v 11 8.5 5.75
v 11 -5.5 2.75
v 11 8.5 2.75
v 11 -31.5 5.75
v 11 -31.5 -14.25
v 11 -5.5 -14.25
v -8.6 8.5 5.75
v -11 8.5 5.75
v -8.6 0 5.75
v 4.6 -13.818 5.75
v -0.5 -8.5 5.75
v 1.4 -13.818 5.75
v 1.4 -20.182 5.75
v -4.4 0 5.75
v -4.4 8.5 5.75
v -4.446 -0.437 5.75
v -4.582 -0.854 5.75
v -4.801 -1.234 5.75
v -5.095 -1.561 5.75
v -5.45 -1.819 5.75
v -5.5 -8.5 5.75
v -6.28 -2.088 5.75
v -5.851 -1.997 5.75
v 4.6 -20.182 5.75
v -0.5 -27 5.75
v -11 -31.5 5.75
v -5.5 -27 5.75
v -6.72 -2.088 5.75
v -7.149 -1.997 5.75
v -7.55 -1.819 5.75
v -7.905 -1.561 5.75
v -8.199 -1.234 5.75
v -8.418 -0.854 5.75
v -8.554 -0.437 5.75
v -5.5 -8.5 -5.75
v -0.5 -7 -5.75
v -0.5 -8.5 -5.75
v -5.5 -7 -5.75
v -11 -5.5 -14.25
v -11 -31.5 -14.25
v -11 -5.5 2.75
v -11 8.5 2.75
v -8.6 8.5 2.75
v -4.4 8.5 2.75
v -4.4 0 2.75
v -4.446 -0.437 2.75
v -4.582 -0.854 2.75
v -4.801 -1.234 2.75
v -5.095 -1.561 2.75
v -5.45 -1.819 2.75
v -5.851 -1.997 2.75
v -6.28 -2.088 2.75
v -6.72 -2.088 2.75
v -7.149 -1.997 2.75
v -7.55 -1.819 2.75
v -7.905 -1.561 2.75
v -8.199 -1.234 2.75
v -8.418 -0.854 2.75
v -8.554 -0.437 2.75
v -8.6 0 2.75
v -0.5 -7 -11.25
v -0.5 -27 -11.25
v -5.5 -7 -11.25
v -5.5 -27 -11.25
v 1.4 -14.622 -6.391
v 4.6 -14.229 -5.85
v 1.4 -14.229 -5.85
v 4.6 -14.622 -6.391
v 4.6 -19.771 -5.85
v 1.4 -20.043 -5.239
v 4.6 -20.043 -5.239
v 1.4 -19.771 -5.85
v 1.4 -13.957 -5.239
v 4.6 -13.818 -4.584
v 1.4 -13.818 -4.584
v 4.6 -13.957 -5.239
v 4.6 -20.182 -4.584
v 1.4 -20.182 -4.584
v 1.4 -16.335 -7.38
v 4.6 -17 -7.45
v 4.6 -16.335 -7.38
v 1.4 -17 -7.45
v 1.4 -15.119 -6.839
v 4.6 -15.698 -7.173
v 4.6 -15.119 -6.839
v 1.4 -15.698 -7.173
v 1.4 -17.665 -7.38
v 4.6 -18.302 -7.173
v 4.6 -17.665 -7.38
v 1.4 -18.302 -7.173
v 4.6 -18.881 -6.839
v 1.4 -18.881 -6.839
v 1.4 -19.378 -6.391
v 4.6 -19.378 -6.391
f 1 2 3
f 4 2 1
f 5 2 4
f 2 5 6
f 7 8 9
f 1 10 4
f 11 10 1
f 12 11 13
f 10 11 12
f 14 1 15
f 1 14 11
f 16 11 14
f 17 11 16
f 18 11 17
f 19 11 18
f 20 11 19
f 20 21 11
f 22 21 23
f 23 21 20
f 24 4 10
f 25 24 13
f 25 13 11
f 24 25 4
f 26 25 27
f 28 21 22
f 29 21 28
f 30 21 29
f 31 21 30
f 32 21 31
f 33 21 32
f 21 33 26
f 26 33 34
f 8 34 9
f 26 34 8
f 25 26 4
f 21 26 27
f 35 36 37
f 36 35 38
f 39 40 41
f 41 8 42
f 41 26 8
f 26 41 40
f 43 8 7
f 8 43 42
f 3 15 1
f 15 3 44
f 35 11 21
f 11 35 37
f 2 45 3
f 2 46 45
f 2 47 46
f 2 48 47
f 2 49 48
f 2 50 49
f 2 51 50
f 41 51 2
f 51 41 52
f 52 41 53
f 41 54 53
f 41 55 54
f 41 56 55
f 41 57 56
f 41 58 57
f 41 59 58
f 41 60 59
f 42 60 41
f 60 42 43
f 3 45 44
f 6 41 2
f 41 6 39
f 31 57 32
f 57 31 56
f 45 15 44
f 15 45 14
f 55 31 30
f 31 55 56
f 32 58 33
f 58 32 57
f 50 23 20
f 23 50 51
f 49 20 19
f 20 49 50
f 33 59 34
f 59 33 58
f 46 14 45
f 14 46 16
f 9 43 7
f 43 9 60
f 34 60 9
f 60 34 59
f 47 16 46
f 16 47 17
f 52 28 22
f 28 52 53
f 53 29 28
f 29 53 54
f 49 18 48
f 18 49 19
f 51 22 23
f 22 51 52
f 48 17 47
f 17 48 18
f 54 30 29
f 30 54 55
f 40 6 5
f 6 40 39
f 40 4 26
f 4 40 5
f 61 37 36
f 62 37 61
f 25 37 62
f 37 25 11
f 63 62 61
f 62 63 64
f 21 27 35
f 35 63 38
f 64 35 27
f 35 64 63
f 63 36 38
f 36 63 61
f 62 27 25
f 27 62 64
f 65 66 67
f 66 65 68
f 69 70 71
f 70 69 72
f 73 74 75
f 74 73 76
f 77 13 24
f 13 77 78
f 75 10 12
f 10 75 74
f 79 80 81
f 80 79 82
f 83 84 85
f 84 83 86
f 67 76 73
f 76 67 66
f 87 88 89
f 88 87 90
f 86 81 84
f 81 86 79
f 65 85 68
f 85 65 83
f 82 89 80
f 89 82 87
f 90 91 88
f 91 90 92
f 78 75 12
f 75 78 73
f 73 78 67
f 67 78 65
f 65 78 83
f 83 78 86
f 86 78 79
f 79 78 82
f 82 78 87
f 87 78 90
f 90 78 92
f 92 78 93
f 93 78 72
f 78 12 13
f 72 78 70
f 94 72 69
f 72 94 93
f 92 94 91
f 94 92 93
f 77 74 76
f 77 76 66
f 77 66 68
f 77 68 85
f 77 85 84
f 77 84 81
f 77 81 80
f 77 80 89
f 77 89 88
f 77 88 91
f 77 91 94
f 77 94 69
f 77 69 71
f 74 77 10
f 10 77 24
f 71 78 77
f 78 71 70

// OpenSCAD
$fn = 30;
headplate_w = 20;
headplate_h = 5;
depth = 20;

headplate_mount(headplate_w, headplate_h, depth);

module headplate_mount(
    headplate_w,
    headplate_h,
    depth
){
    diff = 3;
    mm_head = [22, 17, 10+diff/2];
    bolt_d = 4.2;
    magnet_h = 3.2;
    magnet_d = 6.4;
    // Micromanipulator attachment piece of cube
    difference(){
        cube(mm_head, center=true);
        translate([0,diff,-diff])
        cube(mm_head, center=true);

        rotate([0,0,0])
        translate([-6.5,0,(mm_head[2]-(diff))/2])
        hull(){
            cylinder(h=diff+1, d = bolt_d, center=true);
            translate([0,10,0])
            cylinder(h=diff+1, d = bolt_d, center=true);
        }
    }
    
    // Headplate mount piece
    attachment_outer = [mm_head[0], headplate_w + diff*2, depth];
    attachment_inner = [headplate_h, headplate_w, depth-diff];
    translate([0,-(mm_head[1]+headplate_w + diff*2)/2+diff,-depth/2+mm_head[2]/2])
    difference(){
        cube(attachment_outer, center=true);
        translate([-diff,diff/2,diff/2])
        cube(attachment_inner, center=true);
        rotate([0,90,0])
        translate([0,diff/2,diff])
        hull(){
            cylinder(h=magnet_h, d = magnet_d, center=true);
            translate([-20,0,0])
            cylinder(h=magnet_h, d = magnet_d, center=true);
        }
        
    }
}
